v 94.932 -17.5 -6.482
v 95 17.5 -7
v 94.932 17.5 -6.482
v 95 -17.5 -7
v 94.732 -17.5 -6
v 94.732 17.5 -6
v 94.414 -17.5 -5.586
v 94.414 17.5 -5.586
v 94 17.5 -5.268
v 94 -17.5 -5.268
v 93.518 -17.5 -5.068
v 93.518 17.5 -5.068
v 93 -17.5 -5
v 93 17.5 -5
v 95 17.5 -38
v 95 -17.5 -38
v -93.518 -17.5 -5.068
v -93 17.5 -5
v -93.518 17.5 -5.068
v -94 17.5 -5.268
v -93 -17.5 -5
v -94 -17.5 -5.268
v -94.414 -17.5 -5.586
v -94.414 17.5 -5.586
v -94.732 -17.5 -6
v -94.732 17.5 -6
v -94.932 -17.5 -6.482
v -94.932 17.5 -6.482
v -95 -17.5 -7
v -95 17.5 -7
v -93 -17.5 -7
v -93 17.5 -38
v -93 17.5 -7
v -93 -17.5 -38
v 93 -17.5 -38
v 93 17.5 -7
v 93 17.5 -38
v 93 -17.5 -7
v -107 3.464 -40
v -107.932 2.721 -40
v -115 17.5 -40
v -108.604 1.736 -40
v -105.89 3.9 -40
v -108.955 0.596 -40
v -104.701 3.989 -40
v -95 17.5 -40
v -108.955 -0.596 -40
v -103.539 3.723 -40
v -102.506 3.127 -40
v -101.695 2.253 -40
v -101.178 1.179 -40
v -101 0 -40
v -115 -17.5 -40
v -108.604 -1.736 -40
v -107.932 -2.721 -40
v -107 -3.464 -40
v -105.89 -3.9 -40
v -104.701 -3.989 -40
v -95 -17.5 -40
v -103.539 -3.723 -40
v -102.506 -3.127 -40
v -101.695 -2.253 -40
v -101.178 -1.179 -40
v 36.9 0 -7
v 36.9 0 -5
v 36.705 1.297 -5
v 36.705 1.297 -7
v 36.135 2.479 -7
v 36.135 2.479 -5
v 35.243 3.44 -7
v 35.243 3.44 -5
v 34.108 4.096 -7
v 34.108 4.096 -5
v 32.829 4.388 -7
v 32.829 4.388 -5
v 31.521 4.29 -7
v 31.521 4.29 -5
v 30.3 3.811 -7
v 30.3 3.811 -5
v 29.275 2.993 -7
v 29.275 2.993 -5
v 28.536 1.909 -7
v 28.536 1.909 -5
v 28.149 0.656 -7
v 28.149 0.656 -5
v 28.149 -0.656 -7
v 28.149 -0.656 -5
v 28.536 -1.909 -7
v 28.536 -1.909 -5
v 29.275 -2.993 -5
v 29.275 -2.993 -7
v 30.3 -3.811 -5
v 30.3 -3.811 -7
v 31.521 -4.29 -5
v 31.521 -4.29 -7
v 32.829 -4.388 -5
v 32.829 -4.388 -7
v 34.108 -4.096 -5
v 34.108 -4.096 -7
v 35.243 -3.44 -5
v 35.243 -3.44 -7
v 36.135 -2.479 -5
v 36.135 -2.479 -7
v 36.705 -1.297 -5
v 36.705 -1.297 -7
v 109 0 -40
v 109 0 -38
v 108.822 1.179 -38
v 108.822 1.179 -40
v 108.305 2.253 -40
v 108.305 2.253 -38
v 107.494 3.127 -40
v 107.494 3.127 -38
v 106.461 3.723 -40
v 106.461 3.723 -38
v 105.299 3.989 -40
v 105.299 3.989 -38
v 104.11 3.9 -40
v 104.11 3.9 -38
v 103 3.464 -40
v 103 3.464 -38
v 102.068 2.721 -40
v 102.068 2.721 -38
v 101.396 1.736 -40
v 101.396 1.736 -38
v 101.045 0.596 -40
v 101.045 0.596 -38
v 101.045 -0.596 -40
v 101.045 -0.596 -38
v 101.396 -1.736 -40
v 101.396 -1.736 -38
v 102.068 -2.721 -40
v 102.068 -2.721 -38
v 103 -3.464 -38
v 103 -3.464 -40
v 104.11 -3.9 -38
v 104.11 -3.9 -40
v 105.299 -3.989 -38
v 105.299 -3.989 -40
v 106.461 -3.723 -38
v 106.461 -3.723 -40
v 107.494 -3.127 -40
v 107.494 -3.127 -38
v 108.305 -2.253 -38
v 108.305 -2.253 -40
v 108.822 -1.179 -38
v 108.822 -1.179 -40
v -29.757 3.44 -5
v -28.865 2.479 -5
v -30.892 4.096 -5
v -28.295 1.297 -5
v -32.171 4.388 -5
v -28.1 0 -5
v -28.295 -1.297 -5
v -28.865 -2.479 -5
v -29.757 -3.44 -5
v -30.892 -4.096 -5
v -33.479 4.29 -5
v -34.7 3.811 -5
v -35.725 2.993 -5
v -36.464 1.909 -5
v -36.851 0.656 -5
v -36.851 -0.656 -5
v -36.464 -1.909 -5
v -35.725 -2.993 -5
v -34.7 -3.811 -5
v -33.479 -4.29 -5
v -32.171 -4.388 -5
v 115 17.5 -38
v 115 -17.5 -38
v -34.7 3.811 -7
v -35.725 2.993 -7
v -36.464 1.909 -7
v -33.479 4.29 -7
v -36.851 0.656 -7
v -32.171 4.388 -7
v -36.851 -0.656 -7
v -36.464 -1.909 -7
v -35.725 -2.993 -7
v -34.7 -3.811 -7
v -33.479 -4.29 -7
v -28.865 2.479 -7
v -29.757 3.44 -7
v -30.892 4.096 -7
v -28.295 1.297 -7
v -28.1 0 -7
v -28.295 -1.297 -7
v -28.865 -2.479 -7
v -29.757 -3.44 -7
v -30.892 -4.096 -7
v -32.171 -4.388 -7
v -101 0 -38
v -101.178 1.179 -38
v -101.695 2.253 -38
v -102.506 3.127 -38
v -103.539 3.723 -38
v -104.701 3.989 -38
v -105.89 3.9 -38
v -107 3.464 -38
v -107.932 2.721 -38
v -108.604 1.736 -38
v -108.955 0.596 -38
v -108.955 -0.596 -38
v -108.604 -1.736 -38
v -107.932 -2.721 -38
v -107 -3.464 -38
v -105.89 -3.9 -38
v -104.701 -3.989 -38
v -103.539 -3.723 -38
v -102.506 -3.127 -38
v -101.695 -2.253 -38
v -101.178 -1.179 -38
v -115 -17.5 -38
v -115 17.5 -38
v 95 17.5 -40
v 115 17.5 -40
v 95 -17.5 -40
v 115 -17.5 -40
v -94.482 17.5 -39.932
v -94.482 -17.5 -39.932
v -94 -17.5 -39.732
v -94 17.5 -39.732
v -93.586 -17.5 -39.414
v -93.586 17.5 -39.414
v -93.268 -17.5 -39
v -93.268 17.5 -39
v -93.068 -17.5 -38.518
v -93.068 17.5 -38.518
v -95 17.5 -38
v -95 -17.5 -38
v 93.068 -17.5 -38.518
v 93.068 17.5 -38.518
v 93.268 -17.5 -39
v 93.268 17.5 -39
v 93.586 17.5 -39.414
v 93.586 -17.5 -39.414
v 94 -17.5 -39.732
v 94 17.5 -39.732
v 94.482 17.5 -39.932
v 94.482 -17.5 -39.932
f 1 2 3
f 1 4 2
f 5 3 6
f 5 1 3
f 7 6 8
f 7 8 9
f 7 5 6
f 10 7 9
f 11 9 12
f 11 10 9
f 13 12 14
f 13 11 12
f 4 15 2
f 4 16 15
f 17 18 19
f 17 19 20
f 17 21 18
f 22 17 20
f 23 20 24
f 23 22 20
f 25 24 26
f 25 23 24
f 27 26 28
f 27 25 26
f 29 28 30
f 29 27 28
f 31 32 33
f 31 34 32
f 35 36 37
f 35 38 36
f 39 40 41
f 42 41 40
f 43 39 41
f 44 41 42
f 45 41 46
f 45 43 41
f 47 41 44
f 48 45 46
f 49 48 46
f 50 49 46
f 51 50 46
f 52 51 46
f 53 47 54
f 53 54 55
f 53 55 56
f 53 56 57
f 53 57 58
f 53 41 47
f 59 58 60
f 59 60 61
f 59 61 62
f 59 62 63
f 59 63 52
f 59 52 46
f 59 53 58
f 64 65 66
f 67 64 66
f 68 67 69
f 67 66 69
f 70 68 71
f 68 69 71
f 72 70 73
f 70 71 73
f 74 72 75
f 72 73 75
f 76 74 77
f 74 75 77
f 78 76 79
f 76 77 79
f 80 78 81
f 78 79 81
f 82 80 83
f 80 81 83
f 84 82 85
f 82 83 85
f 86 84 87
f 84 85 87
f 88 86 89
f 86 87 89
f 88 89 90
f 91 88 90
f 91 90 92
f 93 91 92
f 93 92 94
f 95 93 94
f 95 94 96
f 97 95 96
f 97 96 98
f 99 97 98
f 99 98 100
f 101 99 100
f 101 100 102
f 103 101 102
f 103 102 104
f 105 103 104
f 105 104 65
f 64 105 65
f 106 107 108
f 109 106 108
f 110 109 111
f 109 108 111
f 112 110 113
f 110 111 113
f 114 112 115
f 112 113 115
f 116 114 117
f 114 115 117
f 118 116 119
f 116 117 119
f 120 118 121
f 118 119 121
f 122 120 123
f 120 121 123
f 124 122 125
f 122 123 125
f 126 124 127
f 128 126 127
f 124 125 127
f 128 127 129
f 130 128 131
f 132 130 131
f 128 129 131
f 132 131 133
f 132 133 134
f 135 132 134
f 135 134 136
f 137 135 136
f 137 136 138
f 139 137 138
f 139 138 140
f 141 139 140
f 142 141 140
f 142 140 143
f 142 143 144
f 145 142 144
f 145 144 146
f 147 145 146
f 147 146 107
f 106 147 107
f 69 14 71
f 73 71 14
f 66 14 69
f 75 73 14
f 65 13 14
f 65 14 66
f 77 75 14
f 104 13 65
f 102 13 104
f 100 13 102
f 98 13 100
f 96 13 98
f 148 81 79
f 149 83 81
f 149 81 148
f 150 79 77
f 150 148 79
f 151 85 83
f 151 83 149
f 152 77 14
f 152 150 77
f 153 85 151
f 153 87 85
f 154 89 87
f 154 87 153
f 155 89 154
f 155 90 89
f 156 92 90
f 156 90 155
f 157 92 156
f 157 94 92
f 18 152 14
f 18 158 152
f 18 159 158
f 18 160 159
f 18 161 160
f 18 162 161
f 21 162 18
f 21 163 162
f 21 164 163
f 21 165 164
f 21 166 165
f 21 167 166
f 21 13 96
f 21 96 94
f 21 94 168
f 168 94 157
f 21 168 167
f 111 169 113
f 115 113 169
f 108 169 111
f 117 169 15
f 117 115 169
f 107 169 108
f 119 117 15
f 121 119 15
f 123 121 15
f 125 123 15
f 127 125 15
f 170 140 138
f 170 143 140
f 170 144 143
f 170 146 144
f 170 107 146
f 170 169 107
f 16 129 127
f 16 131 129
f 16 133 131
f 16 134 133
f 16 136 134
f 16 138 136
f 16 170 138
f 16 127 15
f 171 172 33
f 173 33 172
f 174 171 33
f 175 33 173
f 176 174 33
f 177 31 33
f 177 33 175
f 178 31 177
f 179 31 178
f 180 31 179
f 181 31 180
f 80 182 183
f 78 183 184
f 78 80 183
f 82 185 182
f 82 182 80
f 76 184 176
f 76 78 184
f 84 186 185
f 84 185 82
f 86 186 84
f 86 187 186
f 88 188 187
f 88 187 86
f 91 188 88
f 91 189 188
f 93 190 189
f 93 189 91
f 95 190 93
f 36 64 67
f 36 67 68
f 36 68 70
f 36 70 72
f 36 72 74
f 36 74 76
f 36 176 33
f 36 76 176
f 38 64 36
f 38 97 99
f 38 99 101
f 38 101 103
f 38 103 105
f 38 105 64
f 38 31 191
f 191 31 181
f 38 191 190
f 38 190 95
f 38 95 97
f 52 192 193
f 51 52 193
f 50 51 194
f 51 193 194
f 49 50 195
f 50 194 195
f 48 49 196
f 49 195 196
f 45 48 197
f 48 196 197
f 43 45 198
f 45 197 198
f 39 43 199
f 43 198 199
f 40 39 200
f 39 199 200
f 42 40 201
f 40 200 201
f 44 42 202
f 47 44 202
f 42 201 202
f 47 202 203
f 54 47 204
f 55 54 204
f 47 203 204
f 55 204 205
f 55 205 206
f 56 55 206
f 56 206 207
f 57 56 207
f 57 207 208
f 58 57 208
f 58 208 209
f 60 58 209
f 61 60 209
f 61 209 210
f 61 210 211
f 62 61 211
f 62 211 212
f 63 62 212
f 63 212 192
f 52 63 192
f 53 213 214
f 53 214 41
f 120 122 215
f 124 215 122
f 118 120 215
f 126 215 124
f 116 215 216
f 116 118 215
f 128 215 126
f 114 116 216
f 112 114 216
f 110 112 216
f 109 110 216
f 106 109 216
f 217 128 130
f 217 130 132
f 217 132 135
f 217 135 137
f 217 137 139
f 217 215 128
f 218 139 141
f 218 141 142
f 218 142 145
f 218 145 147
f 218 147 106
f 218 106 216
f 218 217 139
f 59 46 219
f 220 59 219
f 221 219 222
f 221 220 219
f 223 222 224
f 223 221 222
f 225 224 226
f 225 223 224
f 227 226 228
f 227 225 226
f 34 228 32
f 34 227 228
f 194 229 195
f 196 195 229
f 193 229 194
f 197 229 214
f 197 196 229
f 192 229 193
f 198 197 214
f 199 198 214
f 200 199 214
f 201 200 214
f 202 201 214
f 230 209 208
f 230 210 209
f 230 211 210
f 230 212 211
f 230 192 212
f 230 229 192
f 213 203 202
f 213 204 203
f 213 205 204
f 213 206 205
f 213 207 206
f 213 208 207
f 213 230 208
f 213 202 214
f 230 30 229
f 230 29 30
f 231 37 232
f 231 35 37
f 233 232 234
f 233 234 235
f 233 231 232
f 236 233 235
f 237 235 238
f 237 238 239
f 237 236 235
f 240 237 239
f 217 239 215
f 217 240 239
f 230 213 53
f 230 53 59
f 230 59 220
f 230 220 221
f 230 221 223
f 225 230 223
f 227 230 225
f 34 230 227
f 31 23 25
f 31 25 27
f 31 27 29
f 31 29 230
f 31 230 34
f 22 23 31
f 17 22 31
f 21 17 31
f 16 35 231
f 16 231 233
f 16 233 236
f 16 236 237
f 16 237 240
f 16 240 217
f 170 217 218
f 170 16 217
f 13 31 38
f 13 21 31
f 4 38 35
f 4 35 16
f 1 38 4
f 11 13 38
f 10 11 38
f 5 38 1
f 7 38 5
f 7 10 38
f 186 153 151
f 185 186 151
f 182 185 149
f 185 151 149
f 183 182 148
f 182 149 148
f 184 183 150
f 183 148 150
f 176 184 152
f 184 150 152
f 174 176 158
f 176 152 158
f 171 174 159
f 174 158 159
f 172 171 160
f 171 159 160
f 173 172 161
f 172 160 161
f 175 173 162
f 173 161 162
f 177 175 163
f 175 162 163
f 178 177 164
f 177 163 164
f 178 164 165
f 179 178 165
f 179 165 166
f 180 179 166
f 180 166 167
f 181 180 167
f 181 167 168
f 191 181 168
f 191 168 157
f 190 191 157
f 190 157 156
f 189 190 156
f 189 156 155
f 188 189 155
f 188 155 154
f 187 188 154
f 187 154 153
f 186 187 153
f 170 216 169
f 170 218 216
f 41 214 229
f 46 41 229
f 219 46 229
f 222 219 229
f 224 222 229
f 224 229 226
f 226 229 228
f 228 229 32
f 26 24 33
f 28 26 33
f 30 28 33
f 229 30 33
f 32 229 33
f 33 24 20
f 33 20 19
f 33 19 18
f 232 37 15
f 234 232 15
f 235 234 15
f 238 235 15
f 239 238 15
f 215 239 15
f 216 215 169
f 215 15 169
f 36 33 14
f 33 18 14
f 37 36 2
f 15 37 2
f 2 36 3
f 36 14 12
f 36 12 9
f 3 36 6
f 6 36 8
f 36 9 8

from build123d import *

# Parameters (mm, degrees)
F1_DEPTH = 17.5
F2_R     = 4
F3_DEPTH = 25
F4_R     = 4.4
F5_DEPTH = 25
F6_R     = 2


# Not quite as in the source:
# - a feature names something its author has since deleted; it is built from what else it names


with BuildPart() as f1:
    # F0 (on Front) → F1 (new body, symmetric)
    with BuildSketch(Plane.XZ):
        Polygon((95, -38), (95, -5), (-95, -5), (-95, -38), (-115, -38), (-115, -40), (-93, -40), (-93, -7), (93, -7), (93, -40), (115, -40), (115, -38), align=None)
    extrude(amount=F1_DEPTH, both=True)

    # F2 (on face) → F3 (cut)
    with BuildSketch(Plane.XY.offset(-38)):
        with Locations((-105, 0)):
            Circle(F2_R)
        with Locations((105, 0)):
            Circle(F2_R)
    extrude(amount=-F3_DEPTH, mode=Mode.SUBTRACT)

    # F4 (on face) → F5 (cut)
    with BuildSketch(Plane.XY.offset(-5)):
        with Locations((-32.5, 0)):
            Circle(F4_R)
        with Locations((32.5, 0)):
            Circle(F4_R)
    extrude(amount=-F5_DEPTH, mode=Mode.SUBTRACT)

    # F6
    f6_edges = [f1.edges().sort_by_distance(p)[0] for p in [
        (95, 0, -5),
        (-95, 0, -5),
        (-93, 0, -40),
        (93, 0, -40),
    ]]
    fillet(f6_edges, radius=F6_R)


solid = f1.part
